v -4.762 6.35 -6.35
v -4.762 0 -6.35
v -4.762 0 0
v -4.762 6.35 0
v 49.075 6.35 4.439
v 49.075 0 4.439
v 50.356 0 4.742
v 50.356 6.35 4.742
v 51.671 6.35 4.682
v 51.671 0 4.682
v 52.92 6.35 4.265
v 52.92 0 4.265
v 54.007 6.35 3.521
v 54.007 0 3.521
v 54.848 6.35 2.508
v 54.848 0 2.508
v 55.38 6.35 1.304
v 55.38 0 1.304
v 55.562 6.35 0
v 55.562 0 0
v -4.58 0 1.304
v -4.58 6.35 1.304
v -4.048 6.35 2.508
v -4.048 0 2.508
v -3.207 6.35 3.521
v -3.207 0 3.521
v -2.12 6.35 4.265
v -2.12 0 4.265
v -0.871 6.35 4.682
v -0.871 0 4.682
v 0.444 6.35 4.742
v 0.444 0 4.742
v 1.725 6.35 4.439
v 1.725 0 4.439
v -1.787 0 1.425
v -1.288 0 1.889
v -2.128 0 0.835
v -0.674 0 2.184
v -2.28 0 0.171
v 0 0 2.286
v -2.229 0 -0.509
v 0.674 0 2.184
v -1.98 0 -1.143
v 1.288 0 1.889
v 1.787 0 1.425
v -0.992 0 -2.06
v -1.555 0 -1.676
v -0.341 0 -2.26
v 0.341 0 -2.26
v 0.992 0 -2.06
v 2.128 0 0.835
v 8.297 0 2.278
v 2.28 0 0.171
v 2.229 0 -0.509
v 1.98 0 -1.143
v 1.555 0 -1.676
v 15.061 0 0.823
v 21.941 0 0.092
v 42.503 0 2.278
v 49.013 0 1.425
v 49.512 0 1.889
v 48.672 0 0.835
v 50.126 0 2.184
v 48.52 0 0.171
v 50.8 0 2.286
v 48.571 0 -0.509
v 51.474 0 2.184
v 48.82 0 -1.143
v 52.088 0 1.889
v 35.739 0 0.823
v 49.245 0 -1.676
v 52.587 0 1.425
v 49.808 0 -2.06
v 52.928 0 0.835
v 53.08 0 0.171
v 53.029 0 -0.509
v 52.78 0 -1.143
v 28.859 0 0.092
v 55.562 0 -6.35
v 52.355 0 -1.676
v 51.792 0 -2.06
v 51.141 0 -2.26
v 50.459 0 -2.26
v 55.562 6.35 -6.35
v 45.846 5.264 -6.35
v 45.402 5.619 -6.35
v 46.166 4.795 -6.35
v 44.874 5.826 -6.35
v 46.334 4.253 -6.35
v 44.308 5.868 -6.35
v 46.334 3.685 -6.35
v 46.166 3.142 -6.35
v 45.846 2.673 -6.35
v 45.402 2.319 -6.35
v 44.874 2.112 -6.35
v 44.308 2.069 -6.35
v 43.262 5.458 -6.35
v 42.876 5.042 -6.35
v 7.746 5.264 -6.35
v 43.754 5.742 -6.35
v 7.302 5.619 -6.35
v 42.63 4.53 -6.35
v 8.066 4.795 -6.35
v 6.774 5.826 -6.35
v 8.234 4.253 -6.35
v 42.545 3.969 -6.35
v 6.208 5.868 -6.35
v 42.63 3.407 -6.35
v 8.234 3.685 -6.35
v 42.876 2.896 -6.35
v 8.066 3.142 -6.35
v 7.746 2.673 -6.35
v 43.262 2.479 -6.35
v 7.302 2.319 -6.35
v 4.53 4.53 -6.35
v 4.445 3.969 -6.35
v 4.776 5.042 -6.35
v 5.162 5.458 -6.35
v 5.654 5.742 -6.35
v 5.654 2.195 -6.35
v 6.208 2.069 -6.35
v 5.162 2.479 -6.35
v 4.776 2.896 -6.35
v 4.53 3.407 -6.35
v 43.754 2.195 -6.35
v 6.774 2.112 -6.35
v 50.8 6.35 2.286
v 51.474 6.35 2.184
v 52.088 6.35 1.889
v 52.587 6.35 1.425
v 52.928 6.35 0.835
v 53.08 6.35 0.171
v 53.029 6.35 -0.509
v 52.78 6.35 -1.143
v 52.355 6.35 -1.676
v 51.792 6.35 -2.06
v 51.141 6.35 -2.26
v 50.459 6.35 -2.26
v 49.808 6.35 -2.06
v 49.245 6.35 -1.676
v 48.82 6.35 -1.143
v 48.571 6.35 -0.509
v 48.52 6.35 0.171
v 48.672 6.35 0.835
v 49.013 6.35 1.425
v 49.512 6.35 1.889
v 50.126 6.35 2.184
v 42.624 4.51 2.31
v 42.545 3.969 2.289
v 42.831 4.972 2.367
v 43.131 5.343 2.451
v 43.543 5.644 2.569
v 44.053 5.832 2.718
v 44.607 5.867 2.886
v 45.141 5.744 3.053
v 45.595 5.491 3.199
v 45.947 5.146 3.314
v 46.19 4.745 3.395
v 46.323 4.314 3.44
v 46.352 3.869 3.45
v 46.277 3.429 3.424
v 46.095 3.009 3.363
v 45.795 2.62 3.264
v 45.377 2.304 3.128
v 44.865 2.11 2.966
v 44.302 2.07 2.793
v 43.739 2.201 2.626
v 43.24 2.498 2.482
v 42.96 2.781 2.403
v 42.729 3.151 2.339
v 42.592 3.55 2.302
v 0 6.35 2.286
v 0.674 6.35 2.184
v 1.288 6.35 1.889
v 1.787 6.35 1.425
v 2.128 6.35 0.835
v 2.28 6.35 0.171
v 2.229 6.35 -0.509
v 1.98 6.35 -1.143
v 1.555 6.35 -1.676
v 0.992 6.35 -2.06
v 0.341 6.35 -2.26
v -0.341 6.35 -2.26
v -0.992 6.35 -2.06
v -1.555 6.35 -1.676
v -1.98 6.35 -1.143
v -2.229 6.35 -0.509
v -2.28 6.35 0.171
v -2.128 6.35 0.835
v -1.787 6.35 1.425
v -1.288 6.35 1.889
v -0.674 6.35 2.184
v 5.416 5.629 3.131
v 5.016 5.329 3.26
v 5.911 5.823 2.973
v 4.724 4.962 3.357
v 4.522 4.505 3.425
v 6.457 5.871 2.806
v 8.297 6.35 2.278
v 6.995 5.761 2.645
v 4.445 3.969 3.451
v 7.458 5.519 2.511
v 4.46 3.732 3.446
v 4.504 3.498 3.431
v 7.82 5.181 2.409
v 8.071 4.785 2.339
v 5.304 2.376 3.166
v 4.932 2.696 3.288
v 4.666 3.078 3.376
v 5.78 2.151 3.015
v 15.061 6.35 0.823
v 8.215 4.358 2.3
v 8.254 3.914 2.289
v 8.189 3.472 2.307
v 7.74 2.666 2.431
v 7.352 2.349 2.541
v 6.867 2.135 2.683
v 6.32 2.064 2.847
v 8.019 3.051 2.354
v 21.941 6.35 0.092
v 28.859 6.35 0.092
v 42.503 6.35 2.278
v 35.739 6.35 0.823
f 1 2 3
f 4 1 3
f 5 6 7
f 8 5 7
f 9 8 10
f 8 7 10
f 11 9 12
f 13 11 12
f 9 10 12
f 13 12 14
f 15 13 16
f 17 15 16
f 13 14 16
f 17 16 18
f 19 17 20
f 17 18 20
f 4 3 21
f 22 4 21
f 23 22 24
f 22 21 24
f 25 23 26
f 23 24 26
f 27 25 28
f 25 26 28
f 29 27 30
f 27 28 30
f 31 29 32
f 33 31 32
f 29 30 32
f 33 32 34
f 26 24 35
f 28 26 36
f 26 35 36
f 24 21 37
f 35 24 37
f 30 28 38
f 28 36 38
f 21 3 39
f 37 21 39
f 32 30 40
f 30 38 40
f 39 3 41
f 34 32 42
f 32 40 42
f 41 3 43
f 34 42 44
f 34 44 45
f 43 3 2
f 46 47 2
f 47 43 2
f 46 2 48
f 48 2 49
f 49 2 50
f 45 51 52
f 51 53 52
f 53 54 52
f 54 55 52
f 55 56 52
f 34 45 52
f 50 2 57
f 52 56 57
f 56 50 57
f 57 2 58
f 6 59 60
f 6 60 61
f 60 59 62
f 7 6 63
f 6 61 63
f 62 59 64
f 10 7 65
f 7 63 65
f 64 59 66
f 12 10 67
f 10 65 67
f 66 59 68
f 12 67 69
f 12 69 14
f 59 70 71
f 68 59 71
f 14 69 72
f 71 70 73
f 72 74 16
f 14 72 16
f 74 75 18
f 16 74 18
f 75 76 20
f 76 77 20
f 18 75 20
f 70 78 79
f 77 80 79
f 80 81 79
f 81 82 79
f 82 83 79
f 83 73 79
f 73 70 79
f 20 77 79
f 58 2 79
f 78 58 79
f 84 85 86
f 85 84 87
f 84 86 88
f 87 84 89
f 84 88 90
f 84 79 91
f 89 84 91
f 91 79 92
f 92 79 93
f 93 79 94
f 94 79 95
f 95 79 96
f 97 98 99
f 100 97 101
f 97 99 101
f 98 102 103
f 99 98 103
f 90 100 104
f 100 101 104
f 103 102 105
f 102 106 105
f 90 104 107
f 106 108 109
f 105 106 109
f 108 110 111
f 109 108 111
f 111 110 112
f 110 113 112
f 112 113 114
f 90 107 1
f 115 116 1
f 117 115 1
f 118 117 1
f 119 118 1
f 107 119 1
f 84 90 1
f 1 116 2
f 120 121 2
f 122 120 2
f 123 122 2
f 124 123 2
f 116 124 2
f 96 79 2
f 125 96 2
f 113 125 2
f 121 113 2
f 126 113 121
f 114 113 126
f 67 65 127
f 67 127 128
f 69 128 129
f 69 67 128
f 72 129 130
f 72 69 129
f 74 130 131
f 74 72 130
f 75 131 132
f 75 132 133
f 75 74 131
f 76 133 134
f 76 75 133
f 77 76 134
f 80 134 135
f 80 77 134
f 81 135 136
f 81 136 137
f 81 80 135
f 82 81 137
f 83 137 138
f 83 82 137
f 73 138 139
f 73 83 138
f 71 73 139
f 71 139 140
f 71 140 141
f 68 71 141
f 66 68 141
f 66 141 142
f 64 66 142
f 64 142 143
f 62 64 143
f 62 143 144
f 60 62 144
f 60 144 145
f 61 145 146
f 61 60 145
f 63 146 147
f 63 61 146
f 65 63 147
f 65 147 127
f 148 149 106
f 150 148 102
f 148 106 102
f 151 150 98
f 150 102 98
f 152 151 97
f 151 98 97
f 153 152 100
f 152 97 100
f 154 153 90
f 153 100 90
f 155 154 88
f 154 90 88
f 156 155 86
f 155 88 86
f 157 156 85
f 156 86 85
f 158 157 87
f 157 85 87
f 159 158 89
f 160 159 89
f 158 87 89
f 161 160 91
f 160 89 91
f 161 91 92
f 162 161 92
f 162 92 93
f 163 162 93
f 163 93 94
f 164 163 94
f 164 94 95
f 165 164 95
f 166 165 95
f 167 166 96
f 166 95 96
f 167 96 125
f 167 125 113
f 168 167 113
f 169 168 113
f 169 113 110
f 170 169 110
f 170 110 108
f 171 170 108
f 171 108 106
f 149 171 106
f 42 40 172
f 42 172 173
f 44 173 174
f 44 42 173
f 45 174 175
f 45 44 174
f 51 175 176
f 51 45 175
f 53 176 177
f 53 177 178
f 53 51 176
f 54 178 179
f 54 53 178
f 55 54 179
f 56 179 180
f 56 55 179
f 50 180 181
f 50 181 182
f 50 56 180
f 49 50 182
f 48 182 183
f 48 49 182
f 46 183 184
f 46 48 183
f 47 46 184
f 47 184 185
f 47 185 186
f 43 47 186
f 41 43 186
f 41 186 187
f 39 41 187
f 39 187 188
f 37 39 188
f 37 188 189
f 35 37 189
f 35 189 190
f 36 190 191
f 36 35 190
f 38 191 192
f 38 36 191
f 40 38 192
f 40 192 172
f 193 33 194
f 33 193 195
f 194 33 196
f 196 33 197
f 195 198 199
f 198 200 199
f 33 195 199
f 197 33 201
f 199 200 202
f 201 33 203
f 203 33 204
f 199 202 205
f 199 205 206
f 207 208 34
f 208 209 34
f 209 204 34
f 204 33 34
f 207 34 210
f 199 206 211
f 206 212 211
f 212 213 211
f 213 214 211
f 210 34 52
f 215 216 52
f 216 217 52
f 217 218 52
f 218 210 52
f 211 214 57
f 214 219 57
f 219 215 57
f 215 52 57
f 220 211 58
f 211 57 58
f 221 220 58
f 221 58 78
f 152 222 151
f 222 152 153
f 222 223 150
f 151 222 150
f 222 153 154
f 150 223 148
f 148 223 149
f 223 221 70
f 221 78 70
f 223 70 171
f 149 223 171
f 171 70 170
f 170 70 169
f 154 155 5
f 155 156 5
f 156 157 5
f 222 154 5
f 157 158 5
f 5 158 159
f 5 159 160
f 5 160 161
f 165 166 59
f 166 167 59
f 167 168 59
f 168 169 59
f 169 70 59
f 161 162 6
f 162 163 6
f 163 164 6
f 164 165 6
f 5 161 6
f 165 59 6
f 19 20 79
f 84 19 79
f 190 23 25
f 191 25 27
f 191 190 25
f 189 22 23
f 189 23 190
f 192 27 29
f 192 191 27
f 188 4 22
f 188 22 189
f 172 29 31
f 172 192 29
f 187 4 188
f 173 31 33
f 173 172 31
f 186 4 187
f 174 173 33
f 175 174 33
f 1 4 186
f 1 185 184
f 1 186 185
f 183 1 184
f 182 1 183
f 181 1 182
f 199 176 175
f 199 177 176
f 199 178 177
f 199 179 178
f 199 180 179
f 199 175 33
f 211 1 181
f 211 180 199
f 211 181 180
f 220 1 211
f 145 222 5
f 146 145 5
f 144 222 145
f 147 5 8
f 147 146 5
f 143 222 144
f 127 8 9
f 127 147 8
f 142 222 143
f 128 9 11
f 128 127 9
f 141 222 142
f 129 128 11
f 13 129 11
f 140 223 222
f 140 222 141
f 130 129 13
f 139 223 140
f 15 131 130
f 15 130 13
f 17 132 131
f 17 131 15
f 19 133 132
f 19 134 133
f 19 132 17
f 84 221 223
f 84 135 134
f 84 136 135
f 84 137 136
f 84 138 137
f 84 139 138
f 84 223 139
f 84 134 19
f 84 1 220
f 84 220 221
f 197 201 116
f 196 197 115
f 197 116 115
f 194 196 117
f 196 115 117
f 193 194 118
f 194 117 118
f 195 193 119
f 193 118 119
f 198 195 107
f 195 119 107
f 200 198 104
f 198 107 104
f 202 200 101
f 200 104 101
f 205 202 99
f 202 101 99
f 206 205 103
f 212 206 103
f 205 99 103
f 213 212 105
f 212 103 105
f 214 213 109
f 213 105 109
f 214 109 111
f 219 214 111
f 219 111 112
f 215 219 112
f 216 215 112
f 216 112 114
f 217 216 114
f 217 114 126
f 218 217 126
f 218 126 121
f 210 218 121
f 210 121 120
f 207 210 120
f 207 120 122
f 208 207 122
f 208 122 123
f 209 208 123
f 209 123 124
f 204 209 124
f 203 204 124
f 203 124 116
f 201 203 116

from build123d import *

# Parameters (mm, degrees)
SKETCH1_R               = 2.286
BOSS_EXTRUDE1_DEPTH     = 6.35
CUT_EXTRUDE1_REACH      = 59.018
CUT_EXTRUDE1_END_RADIUS = 65.352083333
SKETCH2_R               = 1.905


with BuildPart() as part:
    # Sketch1 → Boss-Extrude1 (new body)
    with BuildSketch(Plane(origin=(0, 0, 0), x_dir=(1, 0, 0), z_dir=(0, 1, 0))):
        with BuildLine():
            Line((-4.7625, 6.35), (-4.7625, 0))
            ThreePointArc((-4.7625, 0), (-2.689307148, -3.930525832), (1.725283019, -4.439009434))
            ThreePointArc((1.725283019, -4.439009434), (25.4, 0), (49.074716981, -4.439009434))
            ThreePointArc((49.074716981, -4.439009434), (53.489307148, -3.930525832), (55.5625, 0))
            Line((55.5625, 0), (55.5625, 6.35))
            Line((55.5625, 6.35), (-4.7625, 6.35))
        make_face()
        with Locations(Location((0, 0, 0), (0, 0, 270))):
            Circle(SKETCH1_R, mode=Mode.SUBTRACT)
        with Locations(Location((50.8, 0, 0), (0, 0, 270))):
            Circle(SKETCH1_R, mode=Mode.SUBTRACT)
    extrude(amount=BOSS_EXTRUDE1_DEPTH)

    # Cut-Extrude1: up to this cylinder (the profile starts outside it)
    cut_extrude1_end = Plane(origin=(25.4, 3.96875, 65.352083333), z_dir=(0, -1, 0)) * Cylinder(CUT_EXTRUDE1_END_RADIUS, 249.740166667, mode=Mode.PRIVATE)
    # Sketch2 → Cut-Extrude1 (cut, up to the surface)
    with BuildSketch(Plane(origin=(0, 0, -6.35), x_dir=(-1, 0, 0), z_dir=(0, 0, -1)), mode=Mode.PRIVATE) as cut_extrude1_sk1:
        with Locations((-6.35, 3.96875)):
            Circle(SKETCH2_R)
    cut_extrude1_tool1 = extrude(cut_extrude1_sk1.sketch, amount=-CUT_EXTRUDE1_REACH, mode=Mode.PRIVATE) - cut_extrude1_end
    add(cut_extrude1_tool1.solids().sort_by_distance((6.35, 3.96875, -6.35))[0], mode=Mode.SUBTRACT)
    # Sketch2 → Cut-Extrude1 (cut, up to the surface)
    with BuildSketch(Plane(origin=(0, 0, -6.35), x_dir=(-1, 0, 0), z_dir=(0, 0, -1)), mode=Mode.PRIVATE) as cut_extrude1_sk2:
        with Locations((-44.45, 3.96875)):
            Circle(SKETCH2_R)
    cut_extrude1_tool2 = extrude(cut_extrude1_sk2.sketch, amount=-CUT_EXTRUDE1_REACH, mode=Mode.PRIVATE) - cut_extrude1_end
    add(cut_extrude1_tool2.solids().sort_by_distance((44.45, 3.96875, -6.35))[0], mode=Mode.SUBTRACT)


solid = part.part
